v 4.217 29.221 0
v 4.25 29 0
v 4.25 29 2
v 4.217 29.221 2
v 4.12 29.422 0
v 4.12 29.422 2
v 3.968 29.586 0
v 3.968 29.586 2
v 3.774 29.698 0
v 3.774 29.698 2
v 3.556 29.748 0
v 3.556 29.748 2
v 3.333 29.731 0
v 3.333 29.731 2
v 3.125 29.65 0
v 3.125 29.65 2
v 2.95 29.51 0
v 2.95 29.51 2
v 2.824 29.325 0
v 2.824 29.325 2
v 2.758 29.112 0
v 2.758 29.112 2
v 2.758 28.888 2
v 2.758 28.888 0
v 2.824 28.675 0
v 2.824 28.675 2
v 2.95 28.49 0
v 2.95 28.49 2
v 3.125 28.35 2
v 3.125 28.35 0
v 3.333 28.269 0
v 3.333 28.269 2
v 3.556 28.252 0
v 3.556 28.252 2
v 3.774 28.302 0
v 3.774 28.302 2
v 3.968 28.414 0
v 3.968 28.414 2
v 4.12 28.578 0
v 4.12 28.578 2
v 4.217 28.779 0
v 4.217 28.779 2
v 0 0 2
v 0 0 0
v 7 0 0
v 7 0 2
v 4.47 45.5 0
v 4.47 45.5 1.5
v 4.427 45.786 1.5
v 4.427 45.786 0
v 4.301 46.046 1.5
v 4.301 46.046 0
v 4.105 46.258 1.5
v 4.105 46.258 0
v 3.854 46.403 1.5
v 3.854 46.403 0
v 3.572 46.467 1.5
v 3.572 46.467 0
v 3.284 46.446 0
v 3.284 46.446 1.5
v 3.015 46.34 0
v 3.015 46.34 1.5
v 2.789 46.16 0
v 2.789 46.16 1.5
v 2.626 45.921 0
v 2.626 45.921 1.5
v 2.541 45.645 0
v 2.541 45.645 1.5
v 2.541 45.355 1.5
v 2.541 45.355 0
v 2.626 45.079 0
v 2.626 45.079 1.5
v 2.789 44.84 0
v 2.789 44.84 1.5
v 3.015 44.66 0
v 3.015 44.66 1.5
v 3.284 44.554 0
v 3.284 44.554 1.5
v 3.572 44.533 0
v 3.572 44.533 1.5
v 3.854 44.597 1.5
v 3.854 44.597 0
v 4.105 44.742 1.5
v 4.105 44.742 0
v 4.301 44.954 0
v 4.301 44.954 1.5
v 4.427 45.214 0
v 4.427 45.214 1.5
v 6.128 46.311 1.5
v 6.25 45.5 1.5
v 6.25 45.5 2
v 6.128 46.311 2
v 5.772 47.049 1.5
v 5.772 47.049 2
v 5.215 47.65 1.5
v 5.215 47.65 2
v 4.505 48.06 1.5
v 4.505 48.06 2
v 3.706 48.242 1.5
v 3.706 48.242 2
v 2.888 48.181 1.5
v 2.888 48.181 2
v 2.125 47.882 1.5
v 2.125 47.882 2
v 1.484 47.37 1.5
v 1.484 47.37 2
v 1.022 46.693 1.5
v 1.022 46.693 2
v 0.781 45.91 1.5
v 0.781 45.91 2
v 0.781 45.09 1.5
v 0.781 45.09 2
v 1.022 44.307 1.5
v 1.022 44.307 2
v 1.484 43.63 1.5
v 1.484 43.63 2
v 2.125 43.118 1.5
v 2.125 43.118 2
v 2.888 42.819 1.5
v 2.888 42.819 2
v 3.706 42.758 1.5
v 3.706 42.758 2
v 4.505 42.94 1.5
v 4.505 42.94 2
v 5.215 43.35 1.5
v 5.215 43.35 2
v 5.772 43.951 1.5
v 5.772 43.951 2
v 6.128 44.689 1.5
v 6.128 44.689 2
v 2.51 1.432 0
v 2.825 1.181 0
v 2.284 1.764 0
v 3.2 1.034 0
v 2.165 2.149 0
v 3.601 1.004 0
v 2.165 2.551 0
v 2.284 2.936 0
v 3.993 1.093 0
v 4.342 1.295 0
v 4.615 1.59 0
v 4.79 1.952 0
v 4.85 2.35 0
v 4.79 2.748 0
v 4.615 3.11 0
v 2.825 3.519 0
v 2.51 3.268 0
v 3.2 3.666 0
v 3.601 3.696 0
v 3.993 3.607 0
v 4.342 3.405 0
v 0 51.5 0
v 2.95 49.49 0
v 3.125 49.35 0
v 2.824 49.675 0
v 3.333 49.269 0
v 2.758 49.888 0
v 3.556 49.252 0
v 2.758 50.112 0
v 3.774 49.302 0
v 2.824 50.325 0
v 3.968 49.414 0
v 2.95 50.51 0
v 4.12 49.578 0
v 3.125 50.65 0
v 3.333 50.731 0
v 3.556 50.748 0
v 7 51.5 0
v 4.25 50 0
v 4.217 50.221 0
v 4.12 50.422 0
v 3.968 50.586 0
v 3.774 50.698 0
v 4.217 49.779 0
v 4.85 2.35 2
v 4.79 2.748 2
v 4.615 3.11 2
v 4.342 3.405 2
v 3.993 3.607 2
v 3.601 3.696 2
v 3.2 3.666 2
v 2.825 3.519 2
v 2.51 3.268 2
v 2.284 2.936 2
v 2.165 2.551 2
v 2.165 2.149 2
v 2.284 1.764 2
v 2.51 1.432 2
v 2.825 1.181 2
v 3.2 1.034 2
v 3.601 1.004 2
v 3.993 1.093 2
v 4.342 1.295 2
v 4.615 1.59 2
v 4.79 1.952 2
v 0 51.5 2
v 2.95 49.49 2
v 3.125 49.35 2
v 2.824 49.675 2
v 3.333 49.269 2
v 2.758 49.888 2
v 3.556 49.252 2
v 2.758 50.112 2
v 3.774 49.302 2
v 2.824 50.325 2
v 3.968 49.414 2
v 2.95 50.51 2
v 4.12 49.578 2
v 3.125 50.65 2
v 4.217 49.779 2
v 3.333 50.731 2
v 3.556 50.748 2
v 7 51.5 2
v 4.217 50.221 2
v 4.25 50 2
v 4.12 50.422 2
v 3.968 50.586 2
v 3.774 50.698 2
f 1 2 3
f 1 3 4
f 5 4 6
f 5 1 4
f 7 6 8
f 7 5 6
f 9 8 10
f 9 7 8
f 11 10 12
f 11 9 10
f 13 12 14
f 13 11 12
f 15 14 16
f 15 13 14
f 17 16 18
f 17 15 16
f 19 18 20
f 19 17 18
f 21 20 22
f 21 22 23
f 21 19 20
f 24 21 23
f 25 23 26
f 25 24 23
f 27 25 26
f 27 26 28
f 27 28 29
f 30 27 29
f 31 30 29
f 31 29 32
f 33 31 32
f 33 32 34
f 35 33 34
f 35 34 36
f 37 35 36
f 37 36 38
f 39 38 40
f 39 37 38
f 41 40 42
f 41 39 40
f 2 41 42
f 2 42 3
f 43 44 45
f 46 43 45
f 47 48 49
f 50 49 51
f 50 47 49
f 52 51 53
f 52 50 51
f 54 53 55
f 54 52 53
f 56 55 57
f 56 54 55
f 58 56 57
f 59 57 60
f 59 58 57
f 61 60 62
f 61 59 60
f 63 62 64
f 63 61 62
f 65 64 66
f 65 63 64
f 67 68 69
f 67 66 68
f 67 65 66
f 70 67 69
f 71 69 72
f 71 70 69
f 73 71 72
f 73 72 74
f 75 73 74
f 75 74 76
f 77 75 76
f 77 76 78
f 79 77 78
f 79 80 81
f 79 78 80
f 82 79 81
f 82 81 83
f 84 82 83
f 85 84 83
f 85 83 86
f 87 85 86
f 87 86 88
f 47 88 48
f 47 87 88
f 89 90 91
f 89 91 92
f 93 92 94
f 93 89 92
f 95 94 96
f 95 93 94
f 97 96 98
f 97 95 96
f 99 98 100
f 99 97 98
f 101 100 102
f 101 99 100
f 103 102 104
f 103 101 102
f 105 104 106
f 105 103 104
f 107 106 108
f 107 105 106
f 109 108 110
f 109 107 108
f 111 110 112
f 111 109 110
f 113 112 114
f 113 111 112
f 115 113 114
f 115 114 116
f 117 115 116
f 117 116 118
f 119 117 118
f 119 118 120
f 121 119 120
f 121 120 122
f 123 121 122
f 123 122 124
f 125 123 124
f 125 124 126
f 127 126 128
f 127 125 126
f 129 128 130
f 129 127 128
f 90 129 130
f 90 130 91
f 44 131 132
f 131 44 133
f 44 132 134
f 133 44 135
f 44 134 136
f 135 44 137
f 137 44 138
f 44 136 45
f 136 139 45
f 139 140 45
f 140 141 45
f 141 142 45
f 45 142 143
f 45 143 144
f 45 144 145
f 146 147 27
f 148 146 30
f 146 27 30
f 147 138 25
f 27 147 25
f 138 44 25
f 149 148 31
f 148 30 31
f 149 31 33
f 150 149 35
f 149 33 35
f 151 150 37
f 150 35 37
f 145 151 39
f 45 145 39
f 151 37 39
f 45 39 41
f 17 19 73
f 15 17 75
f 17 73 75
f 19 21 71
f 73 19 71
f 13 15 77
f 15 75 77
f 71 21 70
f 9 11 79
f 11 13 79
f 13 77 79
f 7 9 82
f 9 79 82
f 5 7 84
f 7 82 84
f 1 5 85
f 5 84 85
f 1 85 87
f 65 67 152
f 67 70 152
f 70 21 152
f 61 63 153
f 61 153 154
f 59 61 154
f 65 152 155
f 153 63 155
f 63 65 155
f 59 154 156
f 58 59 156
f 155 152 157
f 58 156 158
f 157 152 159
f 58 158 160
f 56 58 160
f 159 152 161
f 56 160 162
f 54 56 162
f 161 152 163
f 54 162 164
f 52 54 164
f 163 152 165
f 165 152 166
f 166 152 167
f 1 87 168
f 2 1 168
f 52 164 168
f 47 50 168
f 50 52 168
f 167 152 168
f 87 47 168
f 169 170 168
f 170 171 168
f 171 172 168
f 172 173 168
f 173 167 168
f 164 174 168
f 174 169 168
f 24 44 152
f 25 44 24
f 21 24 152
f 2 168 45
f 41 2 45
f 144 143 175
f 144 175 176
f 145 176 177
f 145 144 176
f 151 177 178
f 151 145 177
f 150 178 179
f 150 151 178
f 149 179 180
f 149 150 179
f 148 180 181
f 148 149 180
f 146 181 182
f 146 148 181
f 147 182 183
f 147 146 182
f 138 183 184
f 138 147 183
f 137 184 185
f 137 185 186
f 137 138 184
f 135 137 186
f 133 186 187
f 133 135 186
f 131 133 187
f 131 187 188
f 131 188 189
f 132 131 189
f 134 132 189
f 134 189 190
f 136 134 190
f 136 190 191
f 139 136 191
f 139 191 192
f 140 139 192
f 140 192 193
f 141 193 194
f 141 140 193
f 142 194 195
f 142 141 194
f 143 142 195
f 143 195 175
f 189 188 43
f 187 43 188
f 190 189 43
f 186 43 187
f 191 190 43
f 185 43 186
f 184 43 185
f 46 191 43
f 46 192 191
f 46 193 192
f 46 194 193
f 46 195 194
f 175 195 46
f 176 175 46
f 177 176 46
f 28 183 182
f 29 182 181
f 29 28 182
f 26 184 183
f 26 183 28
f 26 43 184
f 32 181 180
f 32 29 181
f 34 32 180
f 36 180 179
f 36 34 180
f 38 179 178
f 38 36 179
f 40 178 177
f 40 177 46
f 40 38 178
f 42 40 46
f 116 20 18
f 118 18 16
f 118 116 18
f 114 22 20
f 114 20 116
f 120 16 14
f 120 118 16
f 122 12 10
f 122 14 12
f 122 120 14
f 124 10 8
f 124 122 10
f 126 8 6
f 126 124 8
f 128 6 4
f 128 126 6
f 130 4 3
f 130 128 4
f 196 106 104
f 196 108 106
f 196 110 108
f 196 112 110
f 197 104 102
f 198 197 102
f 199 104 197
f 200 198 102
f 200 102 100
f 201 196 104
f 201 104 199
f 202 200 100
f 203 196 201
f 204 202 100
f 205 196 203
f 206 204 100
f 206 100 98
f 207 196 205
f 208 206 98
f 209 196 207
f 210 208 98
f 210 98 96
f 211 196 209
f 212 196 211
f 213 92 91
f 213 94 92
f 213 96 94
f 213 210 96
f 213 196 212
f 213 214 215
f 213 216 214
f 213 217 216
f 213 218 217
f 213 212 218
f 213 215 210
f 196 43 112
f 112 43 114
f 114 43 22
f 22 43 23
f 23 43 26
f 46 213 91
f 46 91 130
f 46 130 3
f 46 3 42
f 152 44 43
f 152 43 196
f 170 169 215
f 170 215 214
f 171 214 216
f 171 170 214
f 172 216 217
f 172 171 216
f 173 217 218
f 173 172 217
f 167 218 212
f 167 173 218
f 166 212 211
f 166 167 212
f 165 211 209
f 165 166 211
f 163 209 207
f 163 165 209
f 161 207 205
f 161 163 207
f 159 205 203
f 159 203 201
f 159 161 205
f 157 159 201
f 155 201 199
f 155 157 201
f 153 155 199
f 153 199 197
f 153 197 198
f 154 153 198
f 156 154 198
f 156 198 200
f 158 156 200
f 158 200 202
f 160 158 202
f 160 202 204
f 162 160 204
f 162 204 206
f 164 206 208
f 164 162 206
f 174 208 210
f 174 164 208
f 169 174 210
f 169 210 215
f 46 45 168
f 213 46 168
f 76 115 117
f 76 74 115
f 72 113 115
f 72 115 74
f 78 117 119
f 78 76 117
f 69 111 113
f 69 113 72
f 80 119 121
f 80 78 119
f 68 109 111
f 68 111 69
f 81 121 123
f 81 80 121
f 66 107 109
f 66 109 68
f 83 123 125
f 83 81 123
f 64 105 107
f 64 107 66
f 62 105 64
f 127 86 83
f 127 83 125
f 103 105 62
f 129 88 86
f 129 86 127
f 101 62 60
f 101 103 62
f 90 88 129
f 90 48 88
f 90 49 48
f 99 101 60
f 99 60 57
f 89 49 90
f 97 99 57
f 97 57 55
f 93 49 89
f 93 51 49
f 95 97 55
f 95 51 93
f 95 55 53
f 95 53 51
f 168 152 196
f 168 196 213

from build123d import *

# Parameters (mm, degrees)
CYLINDER004_R     = 1.35
CYLINDER004_DEPTH = 2
CYLINDER003_R     = 0.75
CYLINDER003_DEPTH = 2
CYLINDER002_R     = 0.75
CYLINDER002_DEPTH = 2
CYLINDER001_R     = 0.97
CYLINDER001_DEPTH = 2
CYLINDER_R        = 2.75
CYLINDER_DEPTH    = 0.5
BOX_W             = 7
BOX_H             = 51.5
BOX_DEPTH         = 2


with BuildPart() as cylinder004:
    # Cylinder004 → Cylinder004 (new body)
    with BuildSketch(Plane(origin=(3.5, 2.35, 0), x_dir=(1, 0, 0), z_dir=(0, 0, 1))):
        Circle(CYLINDER004_R)
    extrude(amount=CYLINDER004_DEPTH)


with BuildPart() as cylinder003:
    # Cylinder003 → Cylinder003 (new body)
    with BuildSketch(Plane(origin=(3.5, 29, 0), x_dir=(1, 0, 0), z_dir=(0, 0, 1))):
        Circle(CYLINDER003_R)
    extrude(amount=CYLINDER003_DEPTH)


with BuildPart() as cylinder002:
    # Cylinder002 → Cylinder002 (new body)
    with BuildSketch(Plane(origin=(3.5, 50, 0), x_dir=(1, 0, 0), z_dir=(0, 0, 1))):
        Circle(CYLINDER002_R)
    extrude(amount=CYLINDER002_DEPTH)


with BuildPart() as cylinder001:
    # Cylinder001 → Cylinder001 (new body)
    with BuildSketch(Plane(origin=(3.5, 45.5, 0), x_dir=(1, 0, 0), z_dir=(0, 0, 1))):
        Circle(CYLINDER001_R)
    extrude(amount=CYLINDER001_DEPTH)


with BuildPart() as cylinder:
    # Cylinder → Cylinder (new body)
    with BuildSketch(Plane(origin=(3.5, 45.5, 1.5), x_dir=(1, 0, 0), z_dir=(0, 0, 1))):
        Circle(CYLINDER_R)
    extrude(amount=CYLINDER_DEPTH)


with BuildPart() as cut004:
    # Box → Box (new body)
    with BuildSketch(Plane.XY):
        with Locations((3.5, 25.75)):
            Rectangle(BOX_W, BOX_H)
    extrude(amount=BOX_DEPTH)

    # Cut: cut Cylinder
    add(cylinder.part, mode=Mode.SUBTRACT)

    # Cut001: cut Cylinder001
    add(cylinder001.part, mode=Mode.SUBTRACT)

    # Cut002: cut Cylinder002
    add(cylinder002.part, mode=Mode.SUBTRACT)

    # Cut003: cut Cylinder003
    add(cylinder003.part, mode=Mode.SUBTRACT)

    # Cut004: cut Cylinder004
    add(cylinder004.part, mode=Mode.SUBTRACT)


solid = cut004.part
